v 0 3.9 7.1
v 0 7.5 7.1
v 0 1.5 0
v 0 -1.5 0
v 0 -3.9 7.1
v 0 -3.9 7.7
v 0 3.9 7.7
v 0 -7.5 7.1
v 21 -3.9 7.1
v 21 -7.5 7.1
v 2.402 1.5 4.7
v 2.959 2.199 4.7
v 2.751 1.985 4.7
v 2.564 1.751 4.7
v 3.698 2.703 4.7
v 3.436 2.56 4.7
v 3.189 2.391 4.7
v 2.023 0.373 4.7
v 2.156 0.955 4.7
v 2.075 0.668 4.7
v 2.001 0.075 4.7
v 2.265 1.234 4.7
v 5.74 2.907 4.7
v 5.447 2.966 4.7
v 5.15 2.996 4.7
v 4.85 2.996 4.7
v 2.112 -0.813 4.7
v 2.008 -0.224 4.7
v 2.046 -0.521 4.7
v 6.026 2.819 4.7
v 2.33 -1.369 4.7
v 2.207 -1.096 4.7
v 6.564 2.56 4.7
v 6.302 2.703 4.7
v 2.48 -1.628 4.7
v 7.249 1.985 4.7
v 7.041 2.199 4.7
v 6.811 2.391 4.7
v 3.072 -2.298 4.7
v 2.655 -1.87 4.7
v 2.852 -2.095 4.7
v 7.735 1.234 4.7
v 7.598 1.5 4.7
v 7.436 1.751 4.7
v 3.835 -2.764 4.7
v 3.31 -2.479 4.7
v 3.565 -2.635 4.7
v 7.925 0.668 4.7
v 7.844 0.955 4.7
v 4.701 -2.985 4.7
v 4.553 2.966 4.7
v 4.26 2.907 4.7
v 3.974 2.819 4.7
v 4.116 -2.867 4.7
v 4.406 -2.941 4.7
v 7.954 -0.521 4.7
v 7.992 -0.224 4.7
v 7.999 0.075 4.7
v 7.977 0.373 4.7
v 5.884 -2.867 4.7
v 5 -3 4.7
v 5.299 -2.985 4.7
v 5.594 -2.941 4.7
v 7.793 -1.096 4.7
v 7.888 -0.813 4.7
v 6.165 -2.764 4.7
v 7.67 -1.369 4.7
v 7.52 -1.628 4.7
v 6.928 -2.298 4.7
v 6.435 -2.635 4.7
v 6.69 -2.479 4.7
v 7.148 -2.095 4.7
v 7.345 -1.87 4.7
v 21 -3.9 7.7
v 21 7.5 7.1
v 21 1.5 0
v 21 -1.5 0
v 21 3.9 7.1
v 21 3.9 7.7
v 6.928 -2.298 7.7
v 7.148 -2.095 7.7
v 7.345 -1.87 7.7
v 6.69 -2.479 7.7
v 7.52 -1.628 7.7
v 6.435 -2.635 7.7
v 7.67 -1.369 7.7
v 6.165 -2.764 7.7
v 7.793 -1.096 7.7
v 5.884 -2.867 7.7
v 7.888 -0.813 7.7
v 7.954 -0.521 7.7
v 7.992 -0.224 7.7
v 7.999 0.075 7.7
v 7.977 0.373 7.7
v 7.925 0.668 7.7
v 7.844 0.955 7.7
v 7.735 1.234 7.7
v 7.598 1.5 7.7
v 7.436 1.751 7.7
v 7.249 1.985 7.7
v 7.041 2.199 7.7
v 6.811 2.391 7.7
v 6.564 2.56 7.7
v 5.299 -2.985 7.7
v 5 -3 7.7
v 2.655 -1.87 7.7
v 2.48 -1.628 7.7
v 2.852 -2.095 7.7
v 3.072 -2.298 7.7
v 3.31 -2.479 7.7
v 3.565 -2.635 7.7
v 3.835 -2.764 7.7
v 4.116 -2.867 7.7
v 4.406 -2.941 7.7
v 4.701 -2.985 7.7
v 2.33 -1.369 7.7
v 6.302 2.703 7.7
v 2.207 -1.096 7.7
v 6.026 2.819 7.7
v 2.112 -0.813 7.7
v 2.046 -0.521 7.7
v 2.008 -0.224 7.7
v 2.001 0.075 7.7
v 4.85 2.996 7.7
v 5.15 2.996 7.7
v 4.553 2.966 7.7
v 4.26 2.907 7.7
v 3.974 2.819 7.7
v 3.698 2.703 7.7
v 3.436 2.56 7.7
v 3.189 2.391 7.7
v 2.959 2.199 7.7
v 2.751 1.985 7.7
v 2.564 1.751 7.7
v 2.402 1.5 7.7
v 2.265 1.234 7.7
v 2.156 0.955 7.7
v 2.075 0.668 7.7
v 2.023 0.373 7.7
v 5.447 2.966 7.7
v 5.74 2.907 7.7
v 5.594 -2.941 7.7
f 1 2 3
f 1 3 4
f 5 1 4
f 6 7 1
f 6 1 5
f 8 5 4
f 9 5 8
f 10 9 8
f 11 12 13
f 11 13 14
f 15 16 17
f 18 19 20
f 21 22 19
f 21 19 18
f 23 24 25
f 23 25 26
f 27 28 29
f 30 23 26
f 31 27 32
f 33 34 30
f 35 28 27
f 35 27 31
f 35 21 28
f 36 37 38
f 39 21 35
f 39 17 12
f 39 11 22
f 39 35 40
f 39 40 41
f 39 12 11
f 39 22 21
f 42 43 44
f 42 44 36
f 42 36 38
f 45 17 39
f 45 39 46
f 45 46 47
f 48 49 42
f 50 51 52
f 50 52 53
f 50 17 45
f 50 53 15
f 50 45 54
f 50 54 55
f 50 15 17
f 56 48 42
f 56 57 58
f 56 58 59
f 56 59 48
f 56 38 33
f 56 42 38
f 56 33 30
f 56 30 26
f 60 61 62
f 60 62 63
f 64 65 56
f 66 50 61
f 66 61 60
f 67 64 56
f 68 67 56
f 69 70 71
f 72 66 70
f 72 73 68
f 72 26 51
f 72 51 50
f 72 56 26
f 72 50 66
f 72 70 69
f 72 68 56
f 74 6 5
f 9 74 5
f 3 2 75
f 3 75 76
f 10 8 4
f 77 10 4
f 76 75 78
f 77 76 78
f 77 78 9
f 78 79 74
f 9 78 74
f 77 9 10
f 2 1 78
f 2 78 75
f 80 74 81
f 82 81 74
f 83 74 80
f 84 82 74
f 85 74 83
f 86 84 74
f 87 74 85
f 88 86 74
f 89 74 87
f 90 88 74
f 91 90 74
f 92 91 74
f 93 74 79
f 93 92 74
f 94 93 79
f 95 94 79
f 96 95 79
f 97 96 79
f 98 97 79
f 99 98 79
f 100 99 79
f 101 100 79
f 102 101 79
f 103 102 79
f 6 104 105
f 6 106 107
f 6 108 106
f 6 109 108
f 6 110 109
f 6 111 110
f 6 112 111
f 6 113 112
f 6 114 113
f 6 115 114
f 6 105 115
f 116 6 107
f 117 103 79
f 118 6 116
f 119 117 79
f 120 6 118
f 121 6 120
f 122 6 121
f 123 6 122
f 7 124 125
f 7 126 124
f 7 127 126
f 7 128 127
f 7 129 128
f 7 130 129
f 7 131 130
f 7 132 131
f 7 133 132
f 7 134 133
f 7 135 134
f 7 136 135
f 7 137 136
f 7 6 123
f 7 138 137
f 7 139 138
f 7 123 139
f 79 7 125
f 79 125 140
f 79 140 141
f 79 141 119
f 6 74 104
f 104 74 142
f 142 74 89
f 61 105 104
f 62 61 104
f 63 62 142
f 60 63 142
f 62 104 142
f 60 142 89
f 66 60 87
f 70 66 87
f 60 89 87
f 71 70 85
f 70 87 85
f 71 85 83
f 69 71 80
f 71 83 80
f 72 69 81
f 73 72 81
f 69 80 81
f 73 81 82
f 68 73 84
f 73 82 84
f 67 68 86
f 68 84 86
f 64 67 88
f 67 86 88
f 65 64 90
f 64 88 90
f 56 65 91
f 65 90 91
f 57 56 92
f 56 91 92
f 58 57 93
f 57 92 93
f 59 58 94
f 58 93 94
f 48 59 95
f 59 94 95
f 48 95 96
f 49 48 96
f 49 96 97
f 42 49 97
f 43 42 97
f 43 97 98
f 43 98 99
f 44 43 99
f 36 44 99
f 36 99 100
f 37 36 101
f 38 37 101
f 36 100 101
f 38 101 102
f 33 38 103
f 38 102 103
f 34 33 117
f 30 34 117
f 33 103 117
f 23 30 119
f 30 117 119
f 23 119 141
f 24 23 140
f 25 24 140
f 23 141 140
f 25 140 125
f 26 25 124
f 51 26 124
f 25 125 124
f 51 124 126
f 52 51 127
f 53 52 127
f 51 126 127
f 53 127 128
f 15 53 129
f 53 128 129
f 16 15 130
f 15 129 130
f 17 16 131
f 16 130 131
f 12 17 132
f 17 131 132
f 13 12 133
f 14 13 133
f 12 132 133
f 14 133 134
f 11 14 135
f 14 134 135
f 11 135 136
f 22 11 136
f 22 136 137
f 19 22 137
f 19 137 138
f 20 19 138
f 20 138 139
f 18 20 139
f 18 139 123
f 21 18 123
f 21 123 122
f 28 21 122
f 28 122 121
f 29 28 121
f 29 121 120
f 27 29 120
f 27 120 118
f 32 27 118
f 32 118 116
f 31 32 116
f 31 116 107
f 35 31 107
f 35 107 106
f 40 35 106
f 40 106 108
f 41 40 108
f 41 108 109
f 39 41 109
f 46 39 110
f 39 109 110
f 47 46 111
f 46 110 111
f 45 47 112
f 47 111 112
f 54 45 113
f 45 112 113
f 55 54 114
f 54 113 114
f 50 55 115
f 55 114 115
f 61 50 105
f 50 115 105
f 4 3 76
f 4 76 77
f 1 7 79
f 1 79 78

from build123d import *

# Parameters (mm, degrees)
PAD_DEPTH    = 21
SKETCH001_R  = 3
POCKET_DEPTH = 3


with BuildPart() as part:
    # Sketch → Pad (new body)
    with BuildSketch(Plane.YZ):
        Polygon((-7.5, 7.1), (-1.5, 0), (0, 0), (0, 7.7), (-3.9, 7.7), (-3.9, 7.1), align=None)
    pad = extrude(amount=PAD_DEPTH)

    # Mirrored: Pad across Sketch V_Axis
    add(pad.mirror(Plane(origin=(0, 0, 0), x_dir=(1, 0, 0), z_dir=(0, 1, 0))))

    # Sketch001 (on Face10 of Mirrored) → Pocket (cut)
    with BuildSketch(Plane(origin=(0, 0, 7.7), x_dir=(0, -1, 0), z_dir=(0, 0, 1))):
        with Locations((0, 5)):
            Circle(SKETCH001_R)
    extrude(amount=-POCKET_DEPTH, mode=Mode.SUBTRACT)


solid = part.part
